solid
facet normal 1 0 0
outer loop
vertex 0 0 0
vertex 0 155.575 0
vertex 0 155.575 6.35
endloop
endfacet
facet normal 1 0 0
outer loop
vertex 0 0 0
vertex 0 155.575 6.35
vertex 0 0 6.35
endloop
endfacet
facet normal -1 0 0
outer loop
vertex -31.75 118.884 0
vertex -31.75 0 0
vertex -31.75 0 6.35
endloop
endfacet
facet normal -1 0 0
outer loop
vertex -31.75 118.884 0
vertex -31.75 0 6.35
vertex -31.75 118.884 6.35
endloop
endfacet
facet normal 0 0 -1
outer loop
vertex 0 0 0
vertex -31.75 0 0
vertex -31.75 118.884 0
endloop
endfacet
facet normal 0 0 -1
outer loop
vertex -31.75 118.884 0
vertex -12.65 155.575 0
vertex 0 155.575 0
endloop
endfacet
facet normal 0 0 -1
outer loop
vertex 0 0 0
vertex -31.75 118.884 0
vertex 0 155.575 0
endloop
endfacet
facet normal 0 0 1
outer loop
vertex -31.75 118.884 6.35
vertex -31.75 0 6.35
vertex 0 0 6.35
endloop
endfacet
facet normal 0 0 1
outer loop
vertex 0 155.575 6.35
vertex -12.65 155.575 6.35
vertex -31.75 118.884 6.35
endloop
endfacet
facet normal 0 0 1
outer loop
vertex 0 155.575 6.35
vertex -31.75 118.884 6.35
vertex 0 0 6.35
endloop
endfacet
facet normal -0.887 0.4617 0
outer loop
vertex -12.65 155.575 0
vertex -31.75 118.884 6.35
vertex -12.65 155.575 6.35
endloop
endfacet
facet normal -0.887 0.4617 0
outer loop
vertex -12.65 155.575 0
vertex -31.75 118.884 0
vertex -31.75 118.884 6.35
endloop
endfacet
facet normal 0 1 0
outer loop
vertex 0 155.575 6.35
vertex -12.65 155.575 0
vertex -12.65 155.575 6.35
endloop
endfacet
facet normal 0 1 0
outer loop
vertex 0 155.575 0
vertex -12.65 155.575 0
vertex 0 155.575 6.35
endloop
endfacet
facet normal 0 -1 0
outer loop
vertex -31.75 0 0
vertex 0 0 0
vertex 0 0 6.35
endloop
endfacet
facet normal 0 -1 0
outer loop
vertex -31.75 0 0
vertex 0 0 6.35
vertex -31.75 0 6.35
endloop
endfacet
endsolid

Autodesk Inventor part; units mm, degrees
ref_plane "YZ Plane" through (0, 0, 0) normal (1, 0, 0) x (0, 1, 0)
ref_plane "XZ Plane" through (0, 0, 0) normal (0, 1, 0) x (-1, 0, 0)
ref_plane "XY Plane" through (0, 0, 0) normal (0, 0, 1) x (1, 0, 0)
sketch "Sketch1" plane through (0, 0, 0) normal (0, 0, 1) x (1, 0, 0)
  line L0 (0, 0) -> (-31.75, 0)
  line L1 (-31.75, 0) -> (-31.75, 155.575)
  line L2 (-31.75, 155.575) -> (0, 155.575)
  line L3 (0, 155.575) -> (0, 0)
  circle A0 centre (-53.975, 55.5625) radius 9.525 construction
  line L4 (-62.4238, 59.9607) -> (-12.6501, 155.575)
  point P0 (-31.75, 118.8844)
  dimension "d2" = 19.05
  dimension "d0" = 31.75
  dimension "d1" = 155.575
  dimension "d3" = 53.975
  dimension "d4" = 55.5625
  dimension "d5" = 27.5
extrude "Extrusion1" add sketch "Sketch1" along normal blind 6.35 contours L0 L1 L4 L2 L3
properties part number "Side Plate" material "UHMW, White"
